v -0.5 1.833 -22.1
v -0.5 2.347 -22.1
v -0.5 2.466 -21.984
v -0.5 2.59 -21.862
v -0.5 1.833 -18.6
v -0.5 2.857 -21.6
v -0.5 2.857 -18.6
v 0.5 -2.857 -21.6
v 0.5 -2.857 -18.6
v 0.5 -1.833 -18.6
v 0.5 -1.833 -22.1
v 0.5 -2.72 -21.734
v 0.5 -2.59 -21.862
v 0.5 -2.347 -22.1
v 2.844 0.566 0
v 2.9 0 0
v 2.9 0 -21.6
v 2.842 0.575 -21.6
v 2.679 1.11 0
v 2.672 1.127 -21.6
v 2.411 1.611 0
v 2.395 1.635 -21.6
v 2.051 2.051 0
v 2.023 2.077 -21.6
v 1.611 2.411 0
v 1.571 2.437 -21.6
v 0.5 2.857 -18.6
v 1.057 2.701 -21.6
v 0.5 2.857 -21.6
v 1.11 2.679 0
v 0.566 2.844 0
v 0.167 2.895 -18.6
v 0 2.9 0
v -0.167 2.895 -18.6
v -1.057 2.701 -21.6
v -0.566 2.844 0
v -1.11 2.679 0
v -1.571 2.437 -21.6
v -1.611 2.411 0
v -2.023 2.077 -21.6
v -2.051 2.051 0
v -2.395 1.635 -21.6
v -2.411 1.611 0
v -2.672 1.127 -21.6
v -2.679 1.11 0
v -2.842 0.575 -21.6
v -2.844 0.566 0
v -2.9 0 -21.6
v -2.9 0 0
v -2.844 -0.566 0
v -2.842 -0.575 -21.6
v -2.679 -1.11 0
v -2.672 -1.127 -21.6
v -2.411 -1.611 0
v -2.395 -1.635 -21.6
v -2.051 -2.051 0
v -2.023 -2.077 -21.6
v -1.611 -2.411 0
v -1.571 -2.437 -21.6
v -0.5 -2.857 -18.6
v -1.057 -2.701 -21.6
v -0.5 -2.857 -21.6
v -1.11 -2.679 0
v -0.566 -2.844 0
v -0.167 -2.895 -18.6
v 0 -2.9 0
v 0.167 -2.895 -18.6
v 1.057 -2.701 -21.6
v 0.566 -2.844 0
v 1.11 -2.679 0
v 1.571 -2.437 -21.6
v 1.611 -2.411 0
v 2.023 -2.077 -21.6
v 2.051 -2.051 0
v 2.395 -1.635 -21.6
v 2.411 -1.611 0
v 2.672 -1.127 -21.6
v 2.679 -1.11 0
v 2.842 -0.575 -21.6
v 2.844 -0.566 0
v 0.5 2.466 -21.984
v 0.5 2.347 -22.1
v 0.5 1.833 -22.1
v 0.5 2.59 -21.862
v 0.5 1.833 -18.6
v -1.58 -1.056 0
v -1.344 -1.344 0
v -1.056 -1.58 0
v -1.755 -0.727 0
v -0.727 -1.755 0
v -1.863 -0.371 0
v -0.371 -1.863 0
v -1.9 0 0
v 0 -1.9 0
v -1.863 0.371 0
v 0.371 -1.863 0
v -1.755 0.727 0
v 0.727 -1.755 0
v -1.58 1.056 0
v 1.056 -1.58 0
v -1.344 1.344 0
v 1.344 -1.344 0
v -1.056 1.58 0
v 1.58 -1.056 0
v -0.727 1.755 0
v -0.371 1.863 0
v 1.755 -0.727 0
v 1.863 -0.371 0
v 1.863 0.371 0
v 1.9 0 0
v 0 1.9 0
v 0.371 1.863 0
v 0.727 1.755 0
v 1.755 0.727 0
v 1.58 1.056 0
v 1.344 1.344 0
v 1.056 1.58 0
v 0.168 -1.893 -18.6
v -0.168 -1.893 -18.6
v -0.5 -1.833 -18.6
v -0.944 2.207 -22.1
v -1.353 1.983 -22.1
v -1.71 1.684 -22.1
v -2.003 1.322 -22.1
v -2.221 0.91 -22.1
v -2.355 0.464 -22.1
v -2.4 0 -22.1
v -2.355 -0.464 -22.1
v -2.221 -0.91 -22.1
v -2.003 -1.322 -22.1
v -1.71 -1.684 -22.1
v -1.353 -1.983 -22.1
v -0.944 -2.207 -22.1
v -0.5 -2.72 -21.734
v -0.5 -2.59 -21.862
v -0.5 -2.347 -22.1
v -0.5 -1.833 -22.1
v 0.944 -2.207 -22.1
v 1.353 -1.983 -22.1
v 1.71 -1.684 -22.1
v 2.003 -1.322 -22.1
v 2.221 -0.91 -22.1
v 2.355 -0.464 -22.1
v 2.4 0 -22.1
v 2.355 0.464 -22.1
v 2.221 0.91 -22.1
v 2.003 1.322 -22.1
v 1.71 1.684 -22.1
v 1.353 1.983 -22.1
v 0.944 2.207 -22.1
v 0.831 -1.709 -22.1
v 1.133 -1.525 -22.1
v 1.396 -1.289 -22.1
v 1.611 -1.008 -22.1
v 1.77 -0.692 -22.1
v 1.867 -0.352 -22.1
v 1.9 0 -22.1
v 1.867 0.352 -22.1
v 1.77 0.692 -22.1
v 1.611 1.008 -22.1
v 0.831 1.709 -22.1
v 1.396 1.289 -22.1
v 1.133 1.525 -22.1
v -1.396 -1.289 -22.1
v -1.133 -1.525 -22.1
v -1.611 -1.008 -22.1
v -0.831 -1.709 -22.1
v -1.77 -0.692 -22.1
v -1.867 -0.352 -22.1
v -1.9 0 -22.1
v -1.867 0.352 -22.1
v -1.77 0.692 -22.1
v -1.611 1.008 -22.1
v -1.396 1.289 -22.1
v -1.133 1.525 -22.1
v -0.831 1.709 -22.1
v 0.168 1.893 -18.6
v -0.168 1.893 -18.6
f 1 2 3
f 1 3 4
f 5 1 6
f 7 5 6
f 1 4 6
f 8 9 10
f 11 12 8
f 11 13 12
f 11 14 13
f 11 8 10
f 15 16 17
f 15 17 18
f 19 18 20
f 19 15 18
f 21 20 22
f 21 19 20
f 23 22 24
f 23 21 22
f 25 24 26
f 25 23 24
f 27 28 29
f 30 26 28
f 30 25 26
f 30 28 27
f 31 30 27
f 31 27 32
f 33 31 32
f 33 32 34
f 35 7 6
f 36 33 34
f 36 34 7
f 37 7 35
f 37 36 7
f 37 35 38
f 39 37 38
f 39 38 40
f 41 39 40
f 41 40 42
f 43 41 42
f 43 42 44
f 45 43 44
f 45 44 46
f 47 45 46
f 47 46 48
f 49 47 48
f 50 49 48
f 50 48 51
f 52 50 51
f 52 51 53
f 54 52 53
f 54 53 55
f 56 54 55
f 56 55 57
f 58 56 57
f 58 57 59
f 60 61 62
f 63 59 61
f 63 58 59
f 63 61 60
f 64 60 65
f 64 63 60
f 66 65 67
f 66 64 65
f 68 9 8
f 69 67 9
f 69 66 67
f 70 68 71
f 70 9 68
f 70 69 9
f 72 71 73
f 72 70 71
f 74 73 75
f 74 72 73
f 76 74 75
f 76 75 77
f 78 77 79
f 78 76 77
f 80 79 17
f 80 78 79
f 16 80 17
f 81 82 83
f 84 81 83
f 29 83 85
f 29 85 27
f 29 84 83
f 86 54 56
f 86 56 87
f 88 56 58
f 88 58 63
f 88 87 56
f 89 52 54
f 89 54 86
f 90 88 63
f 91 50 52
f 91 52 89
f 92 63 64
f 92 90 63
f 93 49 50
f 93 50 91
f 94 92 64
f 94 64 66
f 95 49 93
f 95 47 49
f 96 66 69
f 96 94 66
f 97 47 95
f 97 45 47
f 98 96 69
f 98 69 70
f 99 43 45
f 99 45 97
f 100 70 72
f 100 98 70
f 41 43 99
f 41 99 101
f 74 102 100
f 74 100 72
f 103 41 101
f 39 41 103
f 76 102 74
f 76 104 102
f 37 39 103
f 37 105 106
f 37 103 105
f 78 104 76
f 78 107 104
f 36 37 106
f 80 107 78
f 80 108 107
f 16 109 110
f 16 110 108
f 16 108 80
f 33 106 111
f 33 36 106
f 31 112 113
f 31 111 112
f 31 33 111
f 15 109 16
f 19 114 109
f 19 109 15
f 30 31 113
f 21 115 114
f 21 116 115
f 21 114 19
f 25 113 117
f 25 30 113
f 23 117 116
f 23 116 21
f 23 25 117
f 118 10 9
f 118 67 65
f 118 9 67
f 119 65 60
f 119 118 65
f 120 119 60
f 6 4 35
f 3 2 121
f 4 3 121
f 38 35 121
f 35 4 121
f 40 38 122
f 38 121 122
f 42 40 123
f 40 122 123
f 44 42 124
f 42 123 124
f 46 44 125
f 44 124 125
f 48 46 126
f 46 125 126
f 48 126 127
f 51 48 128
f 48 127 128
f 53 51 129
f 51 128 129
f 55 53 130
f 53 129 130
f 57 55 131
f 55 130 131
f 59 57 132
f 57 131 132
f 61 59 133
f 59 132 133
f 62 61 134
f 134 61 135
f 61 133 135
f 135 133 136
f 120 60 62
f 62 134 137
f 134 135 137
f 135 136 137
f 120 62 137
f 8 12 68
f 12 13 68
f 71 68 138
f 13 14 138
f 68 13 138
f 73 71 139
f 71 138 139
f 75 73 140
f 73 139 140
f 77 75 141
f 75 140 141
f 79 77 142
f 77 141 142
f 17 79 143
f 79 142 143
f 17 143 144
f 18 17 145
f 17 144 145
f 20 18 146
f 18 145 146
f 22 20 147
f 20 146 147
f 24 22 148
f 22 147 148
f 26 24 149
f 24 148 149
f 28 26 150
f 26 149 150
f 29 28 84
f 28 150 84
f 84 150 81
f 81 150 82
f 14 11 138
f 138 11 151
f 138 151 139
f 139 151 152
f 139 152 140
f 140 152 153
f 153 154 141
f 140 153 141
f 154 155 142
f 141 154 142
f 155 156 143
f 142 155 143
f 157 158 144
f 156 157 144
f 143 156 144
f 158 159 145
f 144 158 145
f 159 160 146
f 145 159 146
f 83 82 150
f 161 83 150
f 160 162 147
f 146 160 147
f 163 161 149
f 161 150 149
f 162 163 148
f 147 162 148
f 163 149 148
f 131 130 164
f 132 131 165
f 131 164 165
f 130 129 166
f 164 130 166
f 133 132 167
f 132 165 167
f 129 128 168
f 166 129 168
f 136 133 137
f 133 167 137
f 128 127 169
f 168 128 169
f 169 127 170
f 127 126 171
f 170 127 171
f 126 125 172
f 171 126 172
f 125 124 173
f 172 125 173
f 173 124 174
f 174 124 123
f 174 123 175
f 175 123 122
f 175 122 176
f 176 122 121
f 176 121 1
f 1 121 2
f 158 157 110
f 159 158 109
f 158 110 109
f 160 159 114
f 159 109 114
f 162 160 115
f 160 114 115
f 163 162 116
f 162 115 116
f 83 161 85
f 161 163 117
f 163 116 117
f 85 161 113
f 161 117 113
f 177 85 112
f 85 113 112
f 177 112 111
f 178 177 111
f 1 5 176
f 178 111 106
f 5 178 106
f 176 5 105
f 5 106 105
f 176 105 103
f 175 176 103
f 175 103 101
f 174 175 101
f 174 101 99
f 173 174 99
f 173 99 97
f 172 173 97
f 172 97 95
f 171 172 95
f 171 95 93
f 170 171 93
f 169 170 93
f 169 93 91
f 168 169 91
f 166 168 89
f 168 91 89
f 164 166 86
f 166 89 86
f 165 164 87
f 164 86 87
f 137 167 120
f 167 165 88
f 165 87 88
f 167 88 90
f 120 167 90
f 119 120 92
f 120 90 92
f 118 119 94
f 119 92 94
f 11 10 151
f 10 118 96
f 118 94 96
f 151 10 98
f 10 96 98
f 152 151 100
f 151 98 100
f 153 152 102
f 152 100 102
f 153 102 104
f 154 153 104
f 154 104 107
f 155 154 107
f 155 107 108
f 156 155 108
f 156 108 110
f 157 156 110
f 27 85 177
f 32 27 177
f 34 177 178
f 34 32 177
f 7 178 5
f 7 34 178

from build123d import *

# Parameters (mm, degrees)
SKETCH_1_R          = 2.9
SKETCH_1_R_2        = 1.9
EXTRUDE_1_DEPTH     = 22.1
CHAMFER_1_SIZE      = 0.5
SKETCH_3_W          = 1
SKETCH_3_H          = 1.984217256
CUT_EXTRUDE_1_DEPTH = 3.5


with BuildPart() as part:
    # 草图1 → 拉伸-薄壁1 (new body)
    with BuildSketch(Plane.XY):
        Circle(SKETCH_1_R)
        Circle(SKETCH_1_R_2, mode=Mode.SUBTRACT)
    extrude(amount=-EXTRUDE_1_DEPTH)

    # 倒角1
    chamfer_1_edges = [part.edges().sort_by_distance(p)[0] for p in [
        (-2.9, 0, -22.1),
    ]]
    chamfer(chamfer_1_edges, length=CHAMFER_1_SIZE)

    # 草图3 → 切除-拉伸1 (cut)
    with BuildSketch(Plane(origin=(0, 0, -22.1), x_dir=(-1, 0, 0), z_dir=(0, 0, -1))):
        with Locations((0, -2.273251869)):
            Rectangle(SKETCH_3_W, SKETCH_3_H)
        with Locations((0, 2.273251869)):
            Rectangle(SKETCH_3_W, SKETCH_3_H)
    extrude(amount=-CUT_EXTRUDE_1_DEPTH, mode=Mode.SUBTRACT)


solid = part.part
